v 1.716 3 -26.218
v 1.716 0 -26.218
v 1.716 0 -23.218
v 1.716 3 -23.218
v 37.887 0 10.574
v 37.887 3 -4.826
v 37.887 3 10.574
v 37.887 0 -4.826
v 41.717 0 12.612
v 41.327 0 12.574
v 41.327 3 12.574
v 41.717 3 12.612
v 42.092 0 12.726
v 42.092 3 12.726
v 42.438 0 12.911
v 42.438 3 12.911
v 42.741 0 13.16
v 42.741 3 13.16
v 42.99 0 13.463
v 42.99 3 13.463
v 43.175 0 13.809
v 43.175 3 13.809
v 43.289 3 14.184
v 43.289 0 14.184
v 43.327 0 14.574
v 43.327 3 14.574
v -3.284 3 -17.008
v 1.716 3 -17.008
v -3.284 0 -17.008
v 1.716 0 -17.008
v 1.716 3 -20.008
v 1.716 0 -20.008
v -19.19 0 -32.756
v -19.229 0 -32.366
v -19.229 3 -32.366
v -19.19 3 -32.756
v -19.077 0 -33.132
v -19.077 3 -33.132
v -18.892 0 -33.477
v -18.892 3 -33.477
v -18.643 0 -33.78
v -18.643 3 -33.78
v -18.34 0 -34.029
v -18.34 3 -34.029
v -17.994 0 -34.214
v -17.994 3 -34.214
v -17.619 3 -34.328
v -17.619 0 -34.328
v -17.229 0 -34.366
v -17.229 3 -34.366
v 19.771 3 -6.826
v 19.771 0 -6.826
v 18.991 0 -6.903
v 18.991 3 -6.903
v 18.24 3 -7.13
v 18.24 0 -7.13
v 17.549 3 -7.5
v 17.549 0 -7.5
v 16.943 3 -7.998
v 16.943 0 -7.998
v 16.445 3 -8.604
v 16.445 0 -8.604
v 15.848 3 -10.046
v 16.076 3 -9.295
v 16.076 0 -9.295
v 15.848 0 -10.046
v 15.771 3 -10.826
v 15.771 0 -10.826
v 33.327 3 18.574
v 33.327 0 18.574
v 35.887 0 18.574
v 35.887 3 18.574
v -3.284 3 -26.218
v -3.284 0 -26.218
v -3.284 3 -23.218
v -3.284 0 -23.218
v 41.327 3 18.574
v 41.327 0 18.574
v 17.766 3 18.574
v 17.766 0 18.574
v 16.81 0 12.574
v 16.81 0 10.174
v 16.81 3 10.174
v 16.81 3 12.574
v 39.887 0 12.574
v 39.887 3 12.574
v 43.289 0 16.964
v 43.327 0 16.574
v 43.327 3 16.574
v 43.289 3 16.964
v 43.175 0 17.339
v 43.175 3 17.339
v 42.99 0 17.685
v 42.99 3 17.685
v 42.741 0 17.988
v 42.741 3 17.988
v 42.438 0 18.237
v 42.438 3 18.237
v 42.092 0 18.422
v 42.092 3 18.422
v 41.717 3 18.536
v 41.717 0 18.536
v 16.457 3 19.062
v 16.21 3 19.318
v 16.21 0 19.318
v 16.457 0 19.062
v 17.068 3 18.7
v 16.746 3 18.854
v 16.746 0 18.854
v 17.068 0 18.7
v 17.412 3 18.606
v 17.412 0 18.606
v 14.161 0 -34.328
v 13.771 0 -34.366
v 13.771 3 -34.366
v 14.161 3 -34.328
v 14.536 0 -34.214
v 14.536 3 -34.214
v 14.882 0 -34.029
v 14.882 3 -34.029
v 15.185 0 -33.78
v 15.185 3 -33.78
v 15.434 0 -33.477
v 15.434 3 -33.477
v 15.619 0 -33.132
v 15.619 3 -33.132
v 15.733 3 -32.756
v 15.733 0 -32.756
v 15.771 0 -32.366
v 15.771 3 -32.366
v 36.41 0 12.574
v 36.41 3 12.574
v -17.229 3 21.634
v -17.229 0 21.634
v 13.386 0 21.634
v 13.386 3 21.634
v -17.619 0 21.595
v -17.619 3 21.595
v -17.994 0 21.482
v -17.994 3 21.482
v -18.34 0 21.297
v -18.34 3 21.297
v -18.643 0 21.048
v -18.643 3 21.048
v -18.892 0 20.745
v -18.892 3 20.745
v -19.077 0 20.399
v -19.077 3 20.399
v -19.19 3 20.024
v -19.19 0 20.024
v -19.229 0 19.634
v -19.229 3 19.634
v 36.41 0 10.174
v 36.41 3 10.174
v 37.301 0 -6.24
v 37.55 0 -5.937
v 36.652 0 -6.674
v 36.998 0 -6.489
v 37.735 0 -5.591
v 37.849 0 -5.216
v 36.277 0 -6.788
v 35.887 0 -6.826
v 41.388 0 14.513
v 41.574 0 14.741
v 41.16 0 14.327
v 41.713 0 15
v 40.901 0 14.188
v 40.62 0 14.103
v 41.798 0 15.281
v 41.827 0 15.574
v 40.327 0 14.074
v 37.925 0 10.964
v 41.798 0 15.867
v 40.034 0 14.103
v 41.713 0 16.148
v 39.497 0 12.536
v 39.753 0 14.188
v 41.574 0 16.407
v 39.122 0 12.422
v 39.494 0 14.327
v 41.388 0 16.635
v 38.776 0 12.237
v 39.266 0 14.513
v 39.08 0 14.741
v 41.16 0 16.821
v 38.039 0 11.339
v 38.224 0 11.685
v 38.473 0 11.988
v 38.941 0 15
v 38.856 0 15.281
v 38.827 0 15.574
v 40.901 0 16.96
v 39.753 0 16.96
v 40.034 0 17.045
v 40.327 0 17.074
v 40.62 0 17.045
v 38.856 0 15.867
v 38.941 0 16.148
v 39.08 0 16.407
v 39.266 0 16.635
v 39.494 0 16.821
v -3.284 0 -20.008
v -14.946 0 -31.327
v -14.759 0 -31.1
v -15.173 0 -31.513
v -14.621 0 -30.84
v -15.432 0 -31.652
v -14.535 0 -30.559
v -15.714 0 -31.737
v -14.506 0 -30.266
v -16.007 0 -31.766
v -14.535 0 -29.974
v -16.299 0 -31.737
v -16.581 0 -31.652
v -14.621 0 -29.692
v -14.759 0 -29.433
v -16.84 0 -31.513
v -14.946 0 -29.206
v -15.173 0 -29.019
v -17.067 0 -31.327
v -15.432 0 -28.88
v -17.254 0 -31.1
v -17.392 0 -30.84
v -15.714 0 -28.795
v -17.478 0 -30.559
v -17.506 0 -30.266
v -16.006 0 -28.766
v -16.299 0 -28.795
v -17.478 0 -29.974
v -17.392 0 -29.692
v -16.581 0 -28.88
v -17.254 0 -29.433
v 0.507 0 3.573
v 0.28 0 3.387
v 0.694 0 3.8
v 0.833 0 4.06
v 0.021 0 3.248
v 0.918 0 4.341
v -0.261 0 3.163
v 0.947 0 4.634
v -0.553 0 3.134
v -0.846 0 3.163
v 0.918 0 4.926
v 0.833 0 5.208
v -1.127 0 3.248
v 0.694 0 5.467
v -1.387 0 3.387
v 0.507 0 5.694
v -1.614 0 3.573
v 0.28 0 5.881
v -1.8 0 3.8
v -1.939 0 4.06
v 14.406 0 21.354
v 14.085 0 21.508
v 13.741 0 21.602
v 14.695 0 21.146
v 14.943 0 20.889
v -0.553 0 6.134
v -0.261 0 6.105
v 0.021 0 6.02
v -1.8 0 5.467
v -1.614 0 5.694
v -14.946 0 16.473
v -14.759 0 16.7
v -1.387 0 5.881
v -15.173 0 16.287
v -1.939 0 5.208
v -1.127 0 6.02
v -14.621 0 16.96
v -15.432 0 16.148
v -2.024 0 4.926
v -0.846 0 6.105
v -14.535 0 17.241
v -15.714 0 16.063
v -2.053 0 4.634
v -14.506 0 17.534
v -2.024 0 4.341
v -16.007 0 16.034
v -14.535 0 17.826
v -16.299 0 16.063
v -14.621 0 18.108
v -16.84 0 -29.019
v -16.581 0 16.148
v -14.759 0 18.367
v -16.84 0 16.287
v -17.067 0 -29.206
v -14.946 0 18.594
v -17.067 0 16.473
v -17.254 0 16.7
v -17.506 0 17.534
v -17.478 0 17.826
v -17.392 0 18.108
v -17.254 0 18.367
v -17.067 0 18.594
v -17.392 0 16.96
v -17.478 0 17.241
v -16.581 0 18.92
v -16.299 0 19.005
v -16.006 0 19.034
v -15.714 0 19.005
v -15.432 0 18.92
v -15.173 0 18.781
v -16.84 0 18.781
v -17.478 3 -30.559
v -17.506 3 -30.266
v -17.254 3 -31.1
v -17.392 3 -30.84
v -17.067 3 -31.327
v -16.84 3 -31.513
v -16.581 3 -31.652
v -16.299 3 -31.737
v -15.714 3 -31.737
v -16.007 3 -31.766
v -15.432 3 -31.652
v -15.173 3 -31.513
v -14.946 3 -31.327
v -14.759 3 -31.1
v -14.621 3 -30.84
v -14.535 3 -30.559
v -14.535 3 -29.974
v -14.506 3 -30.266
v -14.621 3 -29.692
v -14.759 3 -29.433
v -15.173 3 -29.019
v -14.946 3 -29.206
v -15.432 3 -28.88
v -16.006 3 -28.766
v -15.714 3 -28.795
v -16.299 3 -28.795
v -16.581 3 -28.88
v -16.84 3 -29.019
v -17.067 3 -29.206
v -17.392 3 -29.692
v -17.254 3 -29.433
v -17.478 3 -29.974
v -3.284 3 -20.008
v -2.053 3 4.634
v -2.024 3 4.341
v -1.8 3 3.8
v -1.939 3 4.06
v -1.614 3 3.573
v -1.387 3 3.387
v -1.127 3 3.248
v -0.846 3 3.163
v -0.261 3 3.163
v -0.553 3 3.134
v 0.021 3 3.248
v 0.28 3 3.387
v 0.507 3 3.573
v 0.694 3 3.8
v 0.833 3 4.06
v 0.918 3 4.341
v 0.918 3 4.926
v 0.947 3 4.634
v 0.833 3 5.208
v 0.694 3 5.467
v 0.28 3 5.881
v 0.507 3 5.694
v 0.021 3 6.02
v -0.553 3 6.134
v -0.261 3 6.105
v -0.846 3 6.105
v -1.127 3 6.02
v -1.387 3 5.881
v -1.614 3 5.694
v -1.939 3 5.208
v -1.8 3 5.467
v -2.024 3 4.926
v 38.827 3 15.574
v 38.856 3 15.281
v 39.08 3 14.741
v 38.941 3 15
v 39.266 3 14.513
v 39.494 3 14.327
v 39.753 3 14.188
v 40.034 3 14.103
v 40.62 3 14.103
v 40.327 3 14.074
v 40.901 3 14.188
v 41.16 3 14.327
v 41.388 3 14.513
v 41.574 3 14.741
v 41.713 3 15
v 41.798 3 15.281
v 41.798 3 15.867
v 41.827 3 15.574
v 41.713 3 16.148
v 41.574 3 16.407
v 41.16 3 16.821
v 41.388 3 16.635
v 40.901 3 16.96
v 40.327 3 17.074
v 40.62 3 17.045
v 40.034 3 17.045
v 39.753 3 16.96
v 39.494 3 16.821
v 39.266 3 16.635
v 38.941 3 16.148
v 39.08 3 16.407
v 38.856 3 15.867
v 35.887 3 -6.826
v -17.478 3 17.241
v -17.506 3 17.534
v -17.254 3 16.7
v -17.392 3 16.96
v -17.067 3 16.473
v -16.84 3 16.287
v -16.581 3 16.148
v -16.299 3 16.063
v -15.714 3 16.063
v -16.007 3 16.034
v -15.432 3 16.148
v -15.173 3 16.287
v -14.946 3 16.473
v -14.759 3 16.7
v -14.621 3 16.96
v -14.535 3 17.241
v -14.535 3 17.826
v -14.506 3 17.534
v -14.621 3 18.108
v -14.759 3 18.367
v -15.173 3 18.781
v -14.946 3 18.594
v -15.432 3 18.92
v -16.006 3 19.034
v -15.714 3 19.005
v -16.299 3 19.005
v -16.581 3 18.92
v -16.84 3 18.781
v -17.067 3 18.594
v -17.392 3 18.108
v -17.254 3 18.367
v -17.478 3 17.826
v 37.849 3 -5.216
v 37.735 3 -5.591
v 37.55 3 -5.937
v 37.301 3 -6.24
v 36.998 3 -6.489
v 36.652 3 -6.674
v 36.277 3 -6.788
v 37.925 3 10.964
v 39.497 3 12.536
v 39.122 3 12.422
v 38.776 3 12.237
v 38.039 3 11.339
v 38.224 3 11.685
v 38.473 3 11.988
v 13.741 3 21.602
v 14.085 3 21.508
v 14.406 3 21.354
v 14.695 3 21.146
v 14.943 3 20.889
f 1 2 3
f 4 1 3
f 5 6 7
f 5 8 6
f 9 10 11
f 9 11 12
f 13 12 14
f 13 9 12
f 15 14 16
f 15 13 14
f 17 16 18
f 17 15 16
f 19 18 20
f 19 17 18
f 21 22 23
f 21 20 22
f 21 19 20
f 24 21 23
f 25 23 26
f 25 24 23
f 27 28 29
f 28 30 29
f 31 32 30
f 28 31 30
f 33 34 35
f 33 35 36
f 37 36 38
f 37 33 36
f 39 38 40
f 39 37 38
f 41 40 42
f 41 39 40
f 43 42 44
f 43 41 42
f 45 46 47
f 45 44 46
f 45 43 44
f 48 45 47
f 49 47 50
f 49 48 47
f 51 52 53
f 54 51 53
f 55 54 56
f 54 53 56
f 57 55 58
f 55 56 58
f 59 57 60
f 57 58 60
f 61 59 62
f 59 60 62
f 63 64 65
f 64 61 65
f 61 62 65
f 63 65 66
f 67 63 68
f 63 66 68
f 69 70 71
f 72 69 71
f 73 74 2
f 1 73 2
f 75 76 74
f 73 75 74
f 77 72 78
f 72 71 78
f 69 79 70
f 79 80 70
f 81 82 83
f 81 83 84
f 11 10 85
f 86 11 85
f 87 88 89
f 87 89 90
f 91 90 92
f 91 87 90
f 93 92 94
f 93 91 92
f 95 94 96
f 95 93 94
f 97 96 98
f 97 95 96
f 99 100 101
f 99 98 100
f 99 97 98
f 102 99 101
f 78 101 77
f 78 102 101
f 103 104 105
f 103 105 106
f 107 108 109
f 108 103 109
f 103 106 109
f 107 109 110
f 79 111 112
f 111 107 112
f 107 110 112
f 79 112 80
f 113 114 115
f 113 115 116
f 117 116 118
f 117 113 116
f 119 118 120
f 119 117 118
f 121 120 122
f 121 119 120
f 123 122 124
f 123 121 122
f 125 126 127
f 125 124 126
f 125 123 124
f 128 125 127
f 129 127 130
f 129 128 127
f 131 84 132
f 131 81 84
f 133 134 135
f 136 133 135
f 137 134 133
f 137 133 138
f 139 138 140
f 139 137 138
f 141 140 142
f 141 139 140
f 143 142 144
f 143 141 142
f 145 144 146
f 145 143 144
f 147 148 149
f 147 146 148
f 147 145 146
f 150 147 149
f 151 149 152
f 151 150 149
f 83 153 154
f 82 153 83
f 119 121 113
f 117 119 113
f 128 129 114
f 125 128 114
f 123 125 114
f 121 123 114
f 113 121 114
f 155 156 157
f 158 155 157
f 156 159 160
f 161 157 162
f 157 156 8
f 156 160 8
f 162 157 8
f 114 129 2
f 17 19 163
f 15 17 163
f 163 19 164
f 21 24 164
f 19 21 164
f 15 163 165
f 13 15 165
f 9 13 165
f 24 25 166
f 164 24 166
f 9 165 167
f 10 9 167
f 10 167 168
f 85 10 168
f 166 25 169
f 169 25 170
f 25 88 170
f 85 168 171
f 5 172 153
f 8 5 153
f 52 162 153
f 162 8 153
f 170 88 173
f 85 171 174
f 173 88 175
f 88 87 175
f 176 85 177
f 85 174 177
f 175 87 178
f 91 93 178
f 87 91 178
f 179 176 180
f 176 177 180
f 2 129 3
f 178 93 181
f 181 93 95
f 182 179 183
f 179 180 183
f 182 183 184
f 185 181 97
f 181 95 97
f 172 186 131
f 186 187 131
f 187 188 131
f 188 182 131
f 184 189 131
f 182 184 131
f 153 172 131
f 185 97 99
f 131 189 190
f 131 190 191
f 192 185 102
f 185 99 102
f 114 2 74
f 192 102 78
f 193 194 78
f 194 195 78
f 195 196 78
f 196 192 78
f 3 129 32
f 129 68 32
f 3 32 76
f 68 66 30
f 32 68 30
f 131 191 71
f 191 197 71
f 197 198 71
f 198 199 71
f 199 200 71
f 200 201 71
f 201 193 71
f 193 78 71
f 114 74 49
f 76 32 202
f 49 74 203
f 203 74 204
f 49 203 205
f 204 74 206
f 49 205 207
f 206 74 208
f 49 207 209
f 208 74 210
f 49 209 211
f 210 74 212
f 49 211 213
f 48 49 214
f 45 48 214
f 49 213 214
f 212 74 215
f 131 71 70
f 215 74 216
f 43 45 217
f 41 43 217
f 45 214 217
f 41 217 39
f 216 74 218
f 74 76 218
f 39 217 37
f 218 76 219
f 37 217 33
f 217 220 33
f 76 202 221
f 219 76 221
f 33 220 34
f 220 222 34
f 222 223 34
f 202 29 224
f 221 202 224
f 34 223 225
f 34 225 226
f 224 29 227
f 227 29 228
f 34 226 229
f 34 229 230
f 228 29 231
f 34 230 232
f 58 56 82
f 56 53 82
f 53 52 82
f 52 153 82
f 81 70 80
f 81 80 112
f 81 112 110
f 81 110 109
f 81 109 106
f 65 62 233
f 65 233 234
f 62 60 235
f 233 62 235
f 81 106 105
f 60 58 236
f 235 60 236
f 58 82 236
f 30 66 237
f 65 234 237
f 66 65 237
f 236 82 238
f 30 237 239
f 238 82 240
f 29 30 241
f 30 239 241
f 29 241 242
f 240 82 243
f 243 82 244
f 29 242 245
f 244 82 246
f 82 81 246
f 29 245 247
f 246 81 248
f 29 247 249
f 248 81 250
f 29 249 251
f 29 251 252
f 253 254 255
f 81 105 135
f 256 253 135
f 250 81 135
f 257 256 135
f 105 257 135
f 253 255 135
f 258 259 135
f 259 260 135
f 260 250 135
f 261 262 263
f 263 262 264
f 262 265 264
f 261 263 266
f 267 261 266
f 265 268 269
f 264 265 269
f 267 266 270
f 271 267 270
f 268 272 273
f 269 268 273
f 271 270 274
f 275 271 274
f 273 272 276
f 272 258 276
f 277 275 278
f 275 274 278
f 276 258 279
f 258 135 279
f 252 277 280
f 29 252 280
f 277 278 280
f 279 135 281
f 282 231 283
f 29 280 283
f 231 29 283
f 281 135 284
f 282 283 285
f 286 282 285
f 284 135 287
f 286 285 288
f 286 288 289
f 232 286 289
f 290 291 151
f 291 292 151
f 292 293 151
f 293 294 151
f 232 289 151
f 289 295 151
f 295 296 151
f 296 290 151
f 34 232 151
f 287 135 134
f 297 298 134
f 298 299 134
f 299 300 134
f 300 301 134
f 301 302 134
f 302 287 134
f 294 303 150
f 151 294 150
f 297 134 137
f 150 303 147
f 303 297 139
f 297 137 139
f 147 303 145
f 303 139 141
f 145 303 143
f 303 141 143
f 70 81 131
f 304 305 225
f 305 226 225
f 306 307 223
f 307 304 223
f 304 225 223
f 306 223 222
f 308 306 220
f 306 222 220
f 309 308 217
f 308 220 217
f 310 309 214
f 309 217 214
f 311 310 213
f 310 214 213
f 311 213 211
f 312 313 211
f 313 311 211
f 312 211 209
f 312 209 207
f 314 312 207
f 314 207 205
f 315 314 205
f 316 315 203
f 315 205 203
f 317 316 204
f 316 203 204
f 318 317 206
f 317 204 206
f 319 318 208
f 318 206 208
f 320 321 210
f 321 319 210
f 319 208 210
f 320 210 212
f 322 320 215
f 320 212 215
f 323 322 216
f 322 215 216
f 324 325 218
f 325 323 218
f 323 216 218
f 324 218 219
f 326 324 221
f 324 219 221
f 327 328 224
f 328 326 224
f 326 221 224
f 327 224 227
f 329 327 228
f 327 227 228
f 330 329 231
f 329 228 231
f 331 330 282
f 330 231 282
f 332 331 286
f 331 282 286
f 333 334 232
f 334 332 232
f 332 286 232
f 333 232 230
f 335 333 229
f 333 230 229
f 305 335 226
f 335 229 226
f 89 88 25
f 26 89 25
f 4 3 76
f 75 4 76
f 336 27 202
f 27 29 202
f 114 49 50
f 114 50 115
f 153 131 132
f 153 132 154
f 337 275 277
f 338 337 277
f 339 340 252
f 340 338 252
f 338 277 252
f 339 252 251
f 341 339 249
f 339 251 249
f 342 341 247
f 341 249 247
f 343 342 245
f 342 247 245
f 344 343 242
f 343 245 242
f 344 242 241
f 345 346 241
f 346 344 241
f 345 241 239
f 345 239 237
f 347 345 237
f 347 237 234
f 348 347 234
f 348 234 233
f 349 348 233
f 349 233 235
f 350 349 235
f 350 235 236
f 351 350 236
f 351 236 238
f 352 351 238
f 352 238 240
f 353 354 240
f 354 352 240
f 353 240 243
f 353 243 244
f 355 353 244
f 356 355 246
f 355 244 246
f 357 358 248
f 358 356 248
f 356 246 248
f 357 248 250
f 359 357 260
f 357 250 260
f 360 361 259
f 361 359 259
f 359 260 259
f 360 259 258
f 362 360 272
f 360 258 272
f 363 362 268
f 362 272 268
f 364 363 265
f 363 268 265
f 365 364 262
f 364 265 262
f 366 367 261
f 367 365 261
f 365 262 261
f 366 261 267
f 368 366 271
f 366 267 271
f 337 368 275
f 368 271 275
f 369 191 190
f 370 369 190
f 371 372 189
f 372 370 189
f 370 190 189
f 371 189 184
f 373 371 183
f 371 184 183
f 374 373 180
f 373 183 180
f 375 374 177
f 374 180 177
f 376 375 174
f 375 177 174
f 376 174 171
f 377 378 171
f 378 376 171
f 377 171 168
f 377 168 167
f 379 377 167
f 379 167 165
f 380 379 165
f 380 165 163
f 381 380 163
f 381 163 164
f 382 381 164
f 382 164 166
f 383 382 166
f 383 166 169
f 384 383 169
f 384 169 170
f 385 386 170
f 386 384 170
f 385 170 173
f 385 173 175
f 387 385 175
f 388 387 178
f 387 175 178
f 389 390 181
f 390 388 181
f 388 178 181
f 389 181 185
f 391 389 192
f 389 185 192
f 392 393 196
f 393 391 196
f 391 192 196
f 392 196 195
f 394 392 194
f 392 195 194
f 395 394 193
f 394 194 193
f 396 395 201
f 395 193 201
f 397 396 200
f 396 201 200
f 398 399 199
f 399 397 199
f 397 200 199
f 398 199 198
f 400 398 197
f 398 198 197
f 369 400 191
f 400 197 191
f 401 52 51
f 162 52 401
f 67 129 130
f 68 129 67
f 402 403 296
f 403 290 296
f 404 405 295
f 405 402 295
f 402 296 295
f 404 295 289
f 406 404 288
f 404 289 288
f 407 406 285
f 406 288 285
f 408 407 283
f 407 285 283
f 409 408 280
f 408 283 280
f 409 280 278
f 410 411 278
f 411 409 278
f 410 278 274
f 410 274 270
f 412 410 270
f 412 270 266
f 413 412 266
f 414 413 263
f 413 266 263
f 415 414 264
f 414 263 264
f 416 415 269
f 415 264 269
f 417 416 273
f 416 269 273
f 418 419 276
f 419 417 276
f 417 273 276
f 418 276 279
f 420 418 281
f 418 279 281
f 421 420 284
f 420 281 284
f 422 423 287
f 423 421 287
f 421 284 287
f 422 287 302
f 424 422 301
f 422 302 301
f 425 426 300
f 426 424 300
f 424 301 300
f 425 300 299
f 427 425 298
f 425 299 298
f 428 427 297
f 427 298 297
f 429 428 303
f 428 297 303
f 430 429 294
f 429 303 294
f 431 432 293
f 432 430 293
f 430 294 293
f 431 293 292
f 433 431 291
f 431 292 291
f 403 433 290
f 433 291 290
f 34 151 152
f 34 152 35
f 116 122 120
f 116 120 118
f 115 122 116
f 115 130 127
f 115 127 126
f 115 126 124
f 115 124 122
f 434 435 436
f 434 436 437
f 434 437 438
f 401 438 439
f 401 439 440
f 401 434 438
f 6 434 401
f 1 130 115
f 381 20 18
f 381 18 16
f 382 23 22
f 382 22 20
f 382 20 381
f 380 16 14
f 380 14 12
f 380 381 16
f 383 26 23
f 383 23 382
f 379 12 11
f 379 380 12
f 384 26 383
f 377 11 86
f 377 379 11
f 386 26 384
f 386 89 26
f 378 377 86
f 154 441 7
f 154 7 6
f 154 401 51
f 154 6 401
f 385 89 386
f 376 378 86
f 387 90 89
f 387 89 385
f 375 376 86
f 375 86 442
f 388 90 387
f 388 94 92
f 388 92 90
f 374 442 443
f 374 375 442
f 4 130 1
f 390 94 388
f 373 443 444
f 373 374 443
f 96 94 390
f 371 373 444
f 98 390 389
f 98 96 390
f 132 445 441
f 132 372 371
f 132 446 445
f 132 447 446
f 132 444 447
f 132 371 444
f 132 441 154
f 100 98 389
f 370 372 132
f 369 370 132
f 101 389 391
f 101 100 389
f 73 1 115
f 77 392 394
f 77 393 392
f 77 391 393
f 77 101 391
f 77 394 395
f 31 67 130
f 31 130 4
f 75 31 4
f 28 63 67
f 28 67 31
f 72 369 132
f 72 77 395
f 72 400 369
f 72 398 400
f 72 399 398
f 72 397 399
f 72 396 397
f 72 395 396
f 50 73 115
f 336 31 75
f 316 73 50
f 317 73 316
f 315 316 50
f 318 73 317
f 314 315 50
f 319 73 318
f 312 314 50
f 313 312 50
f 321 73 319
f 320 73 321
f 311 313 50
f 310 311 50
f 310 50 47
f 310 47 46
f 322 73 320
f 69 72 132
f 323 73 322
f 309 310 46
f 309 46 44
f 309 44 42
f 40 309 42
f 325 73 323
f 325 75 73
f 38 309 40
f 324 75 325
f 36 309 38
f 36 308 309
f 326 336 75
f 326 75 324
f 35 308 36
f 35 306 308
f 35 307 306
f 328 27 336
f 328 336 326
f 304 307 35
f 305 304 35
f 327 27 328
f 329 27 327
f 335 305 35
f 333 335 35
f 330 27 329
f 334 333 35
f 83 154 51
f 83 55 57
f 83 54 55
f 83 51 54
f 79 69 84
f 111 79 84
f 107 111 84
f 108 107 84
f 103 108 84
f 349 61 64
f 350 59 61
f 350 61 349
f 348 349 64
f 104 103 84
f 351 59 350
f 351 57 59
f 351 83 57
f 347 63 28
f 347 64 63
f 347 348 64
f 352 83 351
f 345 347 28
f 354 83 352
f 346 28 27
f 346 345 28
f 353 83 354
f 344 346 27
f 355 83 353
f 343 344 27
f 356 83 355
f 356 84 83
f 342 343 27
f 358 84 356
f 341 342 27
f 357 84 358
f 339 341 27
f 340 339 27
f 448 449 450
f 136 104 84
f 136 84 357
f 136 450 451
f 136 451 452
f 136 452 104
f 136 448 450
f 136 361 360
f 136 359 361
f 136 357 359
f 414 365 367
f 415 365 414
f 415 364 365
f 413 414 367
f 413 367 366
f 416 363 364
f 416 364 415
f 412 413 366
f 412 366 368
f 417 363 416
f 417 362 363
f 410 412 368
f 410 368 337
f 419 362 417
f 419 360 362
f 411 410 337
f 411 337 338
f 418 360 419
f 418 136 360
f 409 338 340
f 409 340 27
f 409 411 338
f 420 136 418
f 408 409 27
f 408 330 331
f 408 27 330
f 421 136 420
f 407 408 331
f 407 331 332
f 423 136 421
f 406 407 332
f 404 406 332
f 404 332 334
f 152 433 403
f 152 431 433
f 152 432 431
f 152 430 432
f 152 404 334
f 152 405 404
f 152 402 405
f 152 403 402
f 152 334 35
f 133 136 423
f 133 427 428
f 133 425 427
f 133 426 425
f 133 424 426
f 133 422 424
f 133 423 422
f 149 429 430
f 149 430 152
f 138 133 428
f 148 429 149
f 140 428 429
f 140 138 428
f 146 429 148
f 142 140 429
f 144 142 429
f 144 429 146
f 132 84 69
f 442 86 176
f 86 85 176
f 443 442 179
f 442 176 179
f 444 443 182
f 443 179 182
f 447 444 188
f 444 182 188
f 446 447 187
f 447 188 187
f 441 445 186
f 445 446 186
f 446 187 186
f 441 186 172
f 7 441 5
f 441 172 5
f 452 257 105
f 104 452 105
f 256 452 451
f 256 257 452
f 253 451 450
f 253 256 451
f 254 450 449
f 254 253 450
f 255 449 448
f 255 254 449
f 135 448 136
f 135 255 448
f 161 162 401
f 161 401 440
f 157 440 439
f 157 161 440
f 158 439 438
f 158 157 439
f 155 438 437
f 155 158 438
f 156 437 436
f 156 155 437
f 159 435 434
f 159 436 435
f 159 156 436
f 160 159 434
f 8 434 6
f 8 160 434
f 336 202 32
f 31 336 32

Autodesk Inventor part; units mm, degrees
ref_plane "YZ Plane" through (0, 0, 0) normal (1, 0, 0) x (0, 1, 0)
ref_plane "XZ Plane" through (0, 0, 0) normal (0, 1, 0) x (-1, 0, 0)
ref_plane "XY Plane" through (0, 0, 0) normal (0, 0, 1) x (1, 0, 0)
sketch "Sketch1" plane through (0, 0, 0) normal (0, 1, 0) x (-1, 0, 0)
  line L0 (19.2289, 19.6338) -> (19.2289, -32.3662)
  line L1 (17.2289, -34.3662) -> (-13.7711, -34.3662)
  line L2 (-15.7711, -32.3662) -> (-15.7711, -10.826)
  line L3 (-19.7711, -6.826) -> (-35.887, -6.826)
  line L4 (-37.887, -4.826) -> (-37.887, 10.574)
  line L5 (17.2289, 21.6338) -> (-13.3861, 21.6338)
  line L6 (-14.943, 20.8893) -> (-16.2097, 19.3185)
  line L7 (-17.7665, 18.574) -> (-35.887, 18.574)
  line L8 (-16.8101, 12.574) -> (-36.4101, 12.574)
  line L9 (-36.4101, 12.574) -> (-36.4101, 10.174)
  line L10 (-36.4101, 10.174) -> (-16.8101, 10.174)
  line L11 (-16.8101, 10.174) -> (-16.8101, 12.574)
  arc A0 (19.2289, 19.6338) -> (17.2289, 21.6338) centre (17.2289, 19.6338) ccw
  arc A1 (17.2289, -34.3662) -> (19.2289, -32.3662) centre (17.2289, -32.3662) ccw
  arc A2 (-15.7711, -32.3662) -> (-13.7711, -34.3662) centre (-13.7711, -32.3662) ccw
  arc A3 (-15.7711, -10.826) -> (-19.7711, -6.826) centre (-19.7711, -10.826) ccw
  arc A4 (-37.887, -4.826) -> (-35.887, -6.826) centre (-35.887, -4.826) ccw
  arc A5 (-17.7665, 18.574) -> (-16.2097, 19.3185) centre (-17.7665, 20.574) ccw
  arc A6 (-13.3861, 21.6338) -> (-14.943, 20.8893) centre (-13.3861, 19.6338) ccw
  line L12 (-33.327, 18.574) -> (-41.327, 18.574)
  line L13 (-43.327, 16.574) -> (-43.327, 14.574)
  line L14 (-41.327, 12.574) -> (-39.887, 12.574)
  circle A7 centre (-40.327, 15.574) radius 1.5
  arc A8 (-37.887, 10.574) -> (-39.887, 12.574) centre (-39.887, 10.574) ccw
  arc A9 (-43.327, 14.574) -> (-41.327, 12.574) centre (-41.327, 14.574) ccw
  arc A10 (-41.327, 18.574) -> (-43.327, 16.574) centre (-41.327, 16.574) ccw
  circle A11 centre (16.0065, 17.5338) radius 1.5
  circle A12 centre (16.0065, -30.2662) radius 1.5
  circle A13 centre (0.5532, 4.6338) radius 1.5
  line L15 (3.2844, -26.2176) -> (-1.7156, -26.2176)
  line L16 (-1.7156, -26.2176) -> (-1.7156, -23.2176)
  line L17 (-1.7156, -23.2176) -> (3.2844, -23.2176)
  line L18 (3.2844, -23.2176) -> (3.2844, -26.2176)
  line L19 (3.2844, -20.0075) -> (-1.7156, -20.0075)
  line L20 (-1.7156, -20.0075) -> (-1.7156, -17.0075)
  line L21 (-1.7156, -17.0075) -> (3.2844, -17.0075)
  line L22 (3.2844, -17.0075) -> (3.2844, -20.0075)
  point P0 (0, 0)
  point P1 (-43.327, 12.574)
  dimension "d5" = 19.6
  dimension "d6" = 2.4
  dimension "d7" = 17
  dimension "d8" = 6
  dimension "d9" = 56
  dimension "d11" = 2
  dimension "d12" = 4
  dimension "d14" = 3
  dimension "d15" = 2
  dimension "d16" = 3
  dimension "d17" = 35
  dimension "d18" = 3
  dimension "d19" = 3
  dimension "d23" = 5
  dimension "d24" = 3
  dimension "d25" = 5
  dimension "d26" = 3
sketch "Sketch2" plane through (0, 0, 0) normal (0, 1, 0) x (-1, 0, 0)
  point P0 (0, 0)
extrude "Extrusion2" add sketch "Sketch1" along normal blind 3
properties part number "coxa"
